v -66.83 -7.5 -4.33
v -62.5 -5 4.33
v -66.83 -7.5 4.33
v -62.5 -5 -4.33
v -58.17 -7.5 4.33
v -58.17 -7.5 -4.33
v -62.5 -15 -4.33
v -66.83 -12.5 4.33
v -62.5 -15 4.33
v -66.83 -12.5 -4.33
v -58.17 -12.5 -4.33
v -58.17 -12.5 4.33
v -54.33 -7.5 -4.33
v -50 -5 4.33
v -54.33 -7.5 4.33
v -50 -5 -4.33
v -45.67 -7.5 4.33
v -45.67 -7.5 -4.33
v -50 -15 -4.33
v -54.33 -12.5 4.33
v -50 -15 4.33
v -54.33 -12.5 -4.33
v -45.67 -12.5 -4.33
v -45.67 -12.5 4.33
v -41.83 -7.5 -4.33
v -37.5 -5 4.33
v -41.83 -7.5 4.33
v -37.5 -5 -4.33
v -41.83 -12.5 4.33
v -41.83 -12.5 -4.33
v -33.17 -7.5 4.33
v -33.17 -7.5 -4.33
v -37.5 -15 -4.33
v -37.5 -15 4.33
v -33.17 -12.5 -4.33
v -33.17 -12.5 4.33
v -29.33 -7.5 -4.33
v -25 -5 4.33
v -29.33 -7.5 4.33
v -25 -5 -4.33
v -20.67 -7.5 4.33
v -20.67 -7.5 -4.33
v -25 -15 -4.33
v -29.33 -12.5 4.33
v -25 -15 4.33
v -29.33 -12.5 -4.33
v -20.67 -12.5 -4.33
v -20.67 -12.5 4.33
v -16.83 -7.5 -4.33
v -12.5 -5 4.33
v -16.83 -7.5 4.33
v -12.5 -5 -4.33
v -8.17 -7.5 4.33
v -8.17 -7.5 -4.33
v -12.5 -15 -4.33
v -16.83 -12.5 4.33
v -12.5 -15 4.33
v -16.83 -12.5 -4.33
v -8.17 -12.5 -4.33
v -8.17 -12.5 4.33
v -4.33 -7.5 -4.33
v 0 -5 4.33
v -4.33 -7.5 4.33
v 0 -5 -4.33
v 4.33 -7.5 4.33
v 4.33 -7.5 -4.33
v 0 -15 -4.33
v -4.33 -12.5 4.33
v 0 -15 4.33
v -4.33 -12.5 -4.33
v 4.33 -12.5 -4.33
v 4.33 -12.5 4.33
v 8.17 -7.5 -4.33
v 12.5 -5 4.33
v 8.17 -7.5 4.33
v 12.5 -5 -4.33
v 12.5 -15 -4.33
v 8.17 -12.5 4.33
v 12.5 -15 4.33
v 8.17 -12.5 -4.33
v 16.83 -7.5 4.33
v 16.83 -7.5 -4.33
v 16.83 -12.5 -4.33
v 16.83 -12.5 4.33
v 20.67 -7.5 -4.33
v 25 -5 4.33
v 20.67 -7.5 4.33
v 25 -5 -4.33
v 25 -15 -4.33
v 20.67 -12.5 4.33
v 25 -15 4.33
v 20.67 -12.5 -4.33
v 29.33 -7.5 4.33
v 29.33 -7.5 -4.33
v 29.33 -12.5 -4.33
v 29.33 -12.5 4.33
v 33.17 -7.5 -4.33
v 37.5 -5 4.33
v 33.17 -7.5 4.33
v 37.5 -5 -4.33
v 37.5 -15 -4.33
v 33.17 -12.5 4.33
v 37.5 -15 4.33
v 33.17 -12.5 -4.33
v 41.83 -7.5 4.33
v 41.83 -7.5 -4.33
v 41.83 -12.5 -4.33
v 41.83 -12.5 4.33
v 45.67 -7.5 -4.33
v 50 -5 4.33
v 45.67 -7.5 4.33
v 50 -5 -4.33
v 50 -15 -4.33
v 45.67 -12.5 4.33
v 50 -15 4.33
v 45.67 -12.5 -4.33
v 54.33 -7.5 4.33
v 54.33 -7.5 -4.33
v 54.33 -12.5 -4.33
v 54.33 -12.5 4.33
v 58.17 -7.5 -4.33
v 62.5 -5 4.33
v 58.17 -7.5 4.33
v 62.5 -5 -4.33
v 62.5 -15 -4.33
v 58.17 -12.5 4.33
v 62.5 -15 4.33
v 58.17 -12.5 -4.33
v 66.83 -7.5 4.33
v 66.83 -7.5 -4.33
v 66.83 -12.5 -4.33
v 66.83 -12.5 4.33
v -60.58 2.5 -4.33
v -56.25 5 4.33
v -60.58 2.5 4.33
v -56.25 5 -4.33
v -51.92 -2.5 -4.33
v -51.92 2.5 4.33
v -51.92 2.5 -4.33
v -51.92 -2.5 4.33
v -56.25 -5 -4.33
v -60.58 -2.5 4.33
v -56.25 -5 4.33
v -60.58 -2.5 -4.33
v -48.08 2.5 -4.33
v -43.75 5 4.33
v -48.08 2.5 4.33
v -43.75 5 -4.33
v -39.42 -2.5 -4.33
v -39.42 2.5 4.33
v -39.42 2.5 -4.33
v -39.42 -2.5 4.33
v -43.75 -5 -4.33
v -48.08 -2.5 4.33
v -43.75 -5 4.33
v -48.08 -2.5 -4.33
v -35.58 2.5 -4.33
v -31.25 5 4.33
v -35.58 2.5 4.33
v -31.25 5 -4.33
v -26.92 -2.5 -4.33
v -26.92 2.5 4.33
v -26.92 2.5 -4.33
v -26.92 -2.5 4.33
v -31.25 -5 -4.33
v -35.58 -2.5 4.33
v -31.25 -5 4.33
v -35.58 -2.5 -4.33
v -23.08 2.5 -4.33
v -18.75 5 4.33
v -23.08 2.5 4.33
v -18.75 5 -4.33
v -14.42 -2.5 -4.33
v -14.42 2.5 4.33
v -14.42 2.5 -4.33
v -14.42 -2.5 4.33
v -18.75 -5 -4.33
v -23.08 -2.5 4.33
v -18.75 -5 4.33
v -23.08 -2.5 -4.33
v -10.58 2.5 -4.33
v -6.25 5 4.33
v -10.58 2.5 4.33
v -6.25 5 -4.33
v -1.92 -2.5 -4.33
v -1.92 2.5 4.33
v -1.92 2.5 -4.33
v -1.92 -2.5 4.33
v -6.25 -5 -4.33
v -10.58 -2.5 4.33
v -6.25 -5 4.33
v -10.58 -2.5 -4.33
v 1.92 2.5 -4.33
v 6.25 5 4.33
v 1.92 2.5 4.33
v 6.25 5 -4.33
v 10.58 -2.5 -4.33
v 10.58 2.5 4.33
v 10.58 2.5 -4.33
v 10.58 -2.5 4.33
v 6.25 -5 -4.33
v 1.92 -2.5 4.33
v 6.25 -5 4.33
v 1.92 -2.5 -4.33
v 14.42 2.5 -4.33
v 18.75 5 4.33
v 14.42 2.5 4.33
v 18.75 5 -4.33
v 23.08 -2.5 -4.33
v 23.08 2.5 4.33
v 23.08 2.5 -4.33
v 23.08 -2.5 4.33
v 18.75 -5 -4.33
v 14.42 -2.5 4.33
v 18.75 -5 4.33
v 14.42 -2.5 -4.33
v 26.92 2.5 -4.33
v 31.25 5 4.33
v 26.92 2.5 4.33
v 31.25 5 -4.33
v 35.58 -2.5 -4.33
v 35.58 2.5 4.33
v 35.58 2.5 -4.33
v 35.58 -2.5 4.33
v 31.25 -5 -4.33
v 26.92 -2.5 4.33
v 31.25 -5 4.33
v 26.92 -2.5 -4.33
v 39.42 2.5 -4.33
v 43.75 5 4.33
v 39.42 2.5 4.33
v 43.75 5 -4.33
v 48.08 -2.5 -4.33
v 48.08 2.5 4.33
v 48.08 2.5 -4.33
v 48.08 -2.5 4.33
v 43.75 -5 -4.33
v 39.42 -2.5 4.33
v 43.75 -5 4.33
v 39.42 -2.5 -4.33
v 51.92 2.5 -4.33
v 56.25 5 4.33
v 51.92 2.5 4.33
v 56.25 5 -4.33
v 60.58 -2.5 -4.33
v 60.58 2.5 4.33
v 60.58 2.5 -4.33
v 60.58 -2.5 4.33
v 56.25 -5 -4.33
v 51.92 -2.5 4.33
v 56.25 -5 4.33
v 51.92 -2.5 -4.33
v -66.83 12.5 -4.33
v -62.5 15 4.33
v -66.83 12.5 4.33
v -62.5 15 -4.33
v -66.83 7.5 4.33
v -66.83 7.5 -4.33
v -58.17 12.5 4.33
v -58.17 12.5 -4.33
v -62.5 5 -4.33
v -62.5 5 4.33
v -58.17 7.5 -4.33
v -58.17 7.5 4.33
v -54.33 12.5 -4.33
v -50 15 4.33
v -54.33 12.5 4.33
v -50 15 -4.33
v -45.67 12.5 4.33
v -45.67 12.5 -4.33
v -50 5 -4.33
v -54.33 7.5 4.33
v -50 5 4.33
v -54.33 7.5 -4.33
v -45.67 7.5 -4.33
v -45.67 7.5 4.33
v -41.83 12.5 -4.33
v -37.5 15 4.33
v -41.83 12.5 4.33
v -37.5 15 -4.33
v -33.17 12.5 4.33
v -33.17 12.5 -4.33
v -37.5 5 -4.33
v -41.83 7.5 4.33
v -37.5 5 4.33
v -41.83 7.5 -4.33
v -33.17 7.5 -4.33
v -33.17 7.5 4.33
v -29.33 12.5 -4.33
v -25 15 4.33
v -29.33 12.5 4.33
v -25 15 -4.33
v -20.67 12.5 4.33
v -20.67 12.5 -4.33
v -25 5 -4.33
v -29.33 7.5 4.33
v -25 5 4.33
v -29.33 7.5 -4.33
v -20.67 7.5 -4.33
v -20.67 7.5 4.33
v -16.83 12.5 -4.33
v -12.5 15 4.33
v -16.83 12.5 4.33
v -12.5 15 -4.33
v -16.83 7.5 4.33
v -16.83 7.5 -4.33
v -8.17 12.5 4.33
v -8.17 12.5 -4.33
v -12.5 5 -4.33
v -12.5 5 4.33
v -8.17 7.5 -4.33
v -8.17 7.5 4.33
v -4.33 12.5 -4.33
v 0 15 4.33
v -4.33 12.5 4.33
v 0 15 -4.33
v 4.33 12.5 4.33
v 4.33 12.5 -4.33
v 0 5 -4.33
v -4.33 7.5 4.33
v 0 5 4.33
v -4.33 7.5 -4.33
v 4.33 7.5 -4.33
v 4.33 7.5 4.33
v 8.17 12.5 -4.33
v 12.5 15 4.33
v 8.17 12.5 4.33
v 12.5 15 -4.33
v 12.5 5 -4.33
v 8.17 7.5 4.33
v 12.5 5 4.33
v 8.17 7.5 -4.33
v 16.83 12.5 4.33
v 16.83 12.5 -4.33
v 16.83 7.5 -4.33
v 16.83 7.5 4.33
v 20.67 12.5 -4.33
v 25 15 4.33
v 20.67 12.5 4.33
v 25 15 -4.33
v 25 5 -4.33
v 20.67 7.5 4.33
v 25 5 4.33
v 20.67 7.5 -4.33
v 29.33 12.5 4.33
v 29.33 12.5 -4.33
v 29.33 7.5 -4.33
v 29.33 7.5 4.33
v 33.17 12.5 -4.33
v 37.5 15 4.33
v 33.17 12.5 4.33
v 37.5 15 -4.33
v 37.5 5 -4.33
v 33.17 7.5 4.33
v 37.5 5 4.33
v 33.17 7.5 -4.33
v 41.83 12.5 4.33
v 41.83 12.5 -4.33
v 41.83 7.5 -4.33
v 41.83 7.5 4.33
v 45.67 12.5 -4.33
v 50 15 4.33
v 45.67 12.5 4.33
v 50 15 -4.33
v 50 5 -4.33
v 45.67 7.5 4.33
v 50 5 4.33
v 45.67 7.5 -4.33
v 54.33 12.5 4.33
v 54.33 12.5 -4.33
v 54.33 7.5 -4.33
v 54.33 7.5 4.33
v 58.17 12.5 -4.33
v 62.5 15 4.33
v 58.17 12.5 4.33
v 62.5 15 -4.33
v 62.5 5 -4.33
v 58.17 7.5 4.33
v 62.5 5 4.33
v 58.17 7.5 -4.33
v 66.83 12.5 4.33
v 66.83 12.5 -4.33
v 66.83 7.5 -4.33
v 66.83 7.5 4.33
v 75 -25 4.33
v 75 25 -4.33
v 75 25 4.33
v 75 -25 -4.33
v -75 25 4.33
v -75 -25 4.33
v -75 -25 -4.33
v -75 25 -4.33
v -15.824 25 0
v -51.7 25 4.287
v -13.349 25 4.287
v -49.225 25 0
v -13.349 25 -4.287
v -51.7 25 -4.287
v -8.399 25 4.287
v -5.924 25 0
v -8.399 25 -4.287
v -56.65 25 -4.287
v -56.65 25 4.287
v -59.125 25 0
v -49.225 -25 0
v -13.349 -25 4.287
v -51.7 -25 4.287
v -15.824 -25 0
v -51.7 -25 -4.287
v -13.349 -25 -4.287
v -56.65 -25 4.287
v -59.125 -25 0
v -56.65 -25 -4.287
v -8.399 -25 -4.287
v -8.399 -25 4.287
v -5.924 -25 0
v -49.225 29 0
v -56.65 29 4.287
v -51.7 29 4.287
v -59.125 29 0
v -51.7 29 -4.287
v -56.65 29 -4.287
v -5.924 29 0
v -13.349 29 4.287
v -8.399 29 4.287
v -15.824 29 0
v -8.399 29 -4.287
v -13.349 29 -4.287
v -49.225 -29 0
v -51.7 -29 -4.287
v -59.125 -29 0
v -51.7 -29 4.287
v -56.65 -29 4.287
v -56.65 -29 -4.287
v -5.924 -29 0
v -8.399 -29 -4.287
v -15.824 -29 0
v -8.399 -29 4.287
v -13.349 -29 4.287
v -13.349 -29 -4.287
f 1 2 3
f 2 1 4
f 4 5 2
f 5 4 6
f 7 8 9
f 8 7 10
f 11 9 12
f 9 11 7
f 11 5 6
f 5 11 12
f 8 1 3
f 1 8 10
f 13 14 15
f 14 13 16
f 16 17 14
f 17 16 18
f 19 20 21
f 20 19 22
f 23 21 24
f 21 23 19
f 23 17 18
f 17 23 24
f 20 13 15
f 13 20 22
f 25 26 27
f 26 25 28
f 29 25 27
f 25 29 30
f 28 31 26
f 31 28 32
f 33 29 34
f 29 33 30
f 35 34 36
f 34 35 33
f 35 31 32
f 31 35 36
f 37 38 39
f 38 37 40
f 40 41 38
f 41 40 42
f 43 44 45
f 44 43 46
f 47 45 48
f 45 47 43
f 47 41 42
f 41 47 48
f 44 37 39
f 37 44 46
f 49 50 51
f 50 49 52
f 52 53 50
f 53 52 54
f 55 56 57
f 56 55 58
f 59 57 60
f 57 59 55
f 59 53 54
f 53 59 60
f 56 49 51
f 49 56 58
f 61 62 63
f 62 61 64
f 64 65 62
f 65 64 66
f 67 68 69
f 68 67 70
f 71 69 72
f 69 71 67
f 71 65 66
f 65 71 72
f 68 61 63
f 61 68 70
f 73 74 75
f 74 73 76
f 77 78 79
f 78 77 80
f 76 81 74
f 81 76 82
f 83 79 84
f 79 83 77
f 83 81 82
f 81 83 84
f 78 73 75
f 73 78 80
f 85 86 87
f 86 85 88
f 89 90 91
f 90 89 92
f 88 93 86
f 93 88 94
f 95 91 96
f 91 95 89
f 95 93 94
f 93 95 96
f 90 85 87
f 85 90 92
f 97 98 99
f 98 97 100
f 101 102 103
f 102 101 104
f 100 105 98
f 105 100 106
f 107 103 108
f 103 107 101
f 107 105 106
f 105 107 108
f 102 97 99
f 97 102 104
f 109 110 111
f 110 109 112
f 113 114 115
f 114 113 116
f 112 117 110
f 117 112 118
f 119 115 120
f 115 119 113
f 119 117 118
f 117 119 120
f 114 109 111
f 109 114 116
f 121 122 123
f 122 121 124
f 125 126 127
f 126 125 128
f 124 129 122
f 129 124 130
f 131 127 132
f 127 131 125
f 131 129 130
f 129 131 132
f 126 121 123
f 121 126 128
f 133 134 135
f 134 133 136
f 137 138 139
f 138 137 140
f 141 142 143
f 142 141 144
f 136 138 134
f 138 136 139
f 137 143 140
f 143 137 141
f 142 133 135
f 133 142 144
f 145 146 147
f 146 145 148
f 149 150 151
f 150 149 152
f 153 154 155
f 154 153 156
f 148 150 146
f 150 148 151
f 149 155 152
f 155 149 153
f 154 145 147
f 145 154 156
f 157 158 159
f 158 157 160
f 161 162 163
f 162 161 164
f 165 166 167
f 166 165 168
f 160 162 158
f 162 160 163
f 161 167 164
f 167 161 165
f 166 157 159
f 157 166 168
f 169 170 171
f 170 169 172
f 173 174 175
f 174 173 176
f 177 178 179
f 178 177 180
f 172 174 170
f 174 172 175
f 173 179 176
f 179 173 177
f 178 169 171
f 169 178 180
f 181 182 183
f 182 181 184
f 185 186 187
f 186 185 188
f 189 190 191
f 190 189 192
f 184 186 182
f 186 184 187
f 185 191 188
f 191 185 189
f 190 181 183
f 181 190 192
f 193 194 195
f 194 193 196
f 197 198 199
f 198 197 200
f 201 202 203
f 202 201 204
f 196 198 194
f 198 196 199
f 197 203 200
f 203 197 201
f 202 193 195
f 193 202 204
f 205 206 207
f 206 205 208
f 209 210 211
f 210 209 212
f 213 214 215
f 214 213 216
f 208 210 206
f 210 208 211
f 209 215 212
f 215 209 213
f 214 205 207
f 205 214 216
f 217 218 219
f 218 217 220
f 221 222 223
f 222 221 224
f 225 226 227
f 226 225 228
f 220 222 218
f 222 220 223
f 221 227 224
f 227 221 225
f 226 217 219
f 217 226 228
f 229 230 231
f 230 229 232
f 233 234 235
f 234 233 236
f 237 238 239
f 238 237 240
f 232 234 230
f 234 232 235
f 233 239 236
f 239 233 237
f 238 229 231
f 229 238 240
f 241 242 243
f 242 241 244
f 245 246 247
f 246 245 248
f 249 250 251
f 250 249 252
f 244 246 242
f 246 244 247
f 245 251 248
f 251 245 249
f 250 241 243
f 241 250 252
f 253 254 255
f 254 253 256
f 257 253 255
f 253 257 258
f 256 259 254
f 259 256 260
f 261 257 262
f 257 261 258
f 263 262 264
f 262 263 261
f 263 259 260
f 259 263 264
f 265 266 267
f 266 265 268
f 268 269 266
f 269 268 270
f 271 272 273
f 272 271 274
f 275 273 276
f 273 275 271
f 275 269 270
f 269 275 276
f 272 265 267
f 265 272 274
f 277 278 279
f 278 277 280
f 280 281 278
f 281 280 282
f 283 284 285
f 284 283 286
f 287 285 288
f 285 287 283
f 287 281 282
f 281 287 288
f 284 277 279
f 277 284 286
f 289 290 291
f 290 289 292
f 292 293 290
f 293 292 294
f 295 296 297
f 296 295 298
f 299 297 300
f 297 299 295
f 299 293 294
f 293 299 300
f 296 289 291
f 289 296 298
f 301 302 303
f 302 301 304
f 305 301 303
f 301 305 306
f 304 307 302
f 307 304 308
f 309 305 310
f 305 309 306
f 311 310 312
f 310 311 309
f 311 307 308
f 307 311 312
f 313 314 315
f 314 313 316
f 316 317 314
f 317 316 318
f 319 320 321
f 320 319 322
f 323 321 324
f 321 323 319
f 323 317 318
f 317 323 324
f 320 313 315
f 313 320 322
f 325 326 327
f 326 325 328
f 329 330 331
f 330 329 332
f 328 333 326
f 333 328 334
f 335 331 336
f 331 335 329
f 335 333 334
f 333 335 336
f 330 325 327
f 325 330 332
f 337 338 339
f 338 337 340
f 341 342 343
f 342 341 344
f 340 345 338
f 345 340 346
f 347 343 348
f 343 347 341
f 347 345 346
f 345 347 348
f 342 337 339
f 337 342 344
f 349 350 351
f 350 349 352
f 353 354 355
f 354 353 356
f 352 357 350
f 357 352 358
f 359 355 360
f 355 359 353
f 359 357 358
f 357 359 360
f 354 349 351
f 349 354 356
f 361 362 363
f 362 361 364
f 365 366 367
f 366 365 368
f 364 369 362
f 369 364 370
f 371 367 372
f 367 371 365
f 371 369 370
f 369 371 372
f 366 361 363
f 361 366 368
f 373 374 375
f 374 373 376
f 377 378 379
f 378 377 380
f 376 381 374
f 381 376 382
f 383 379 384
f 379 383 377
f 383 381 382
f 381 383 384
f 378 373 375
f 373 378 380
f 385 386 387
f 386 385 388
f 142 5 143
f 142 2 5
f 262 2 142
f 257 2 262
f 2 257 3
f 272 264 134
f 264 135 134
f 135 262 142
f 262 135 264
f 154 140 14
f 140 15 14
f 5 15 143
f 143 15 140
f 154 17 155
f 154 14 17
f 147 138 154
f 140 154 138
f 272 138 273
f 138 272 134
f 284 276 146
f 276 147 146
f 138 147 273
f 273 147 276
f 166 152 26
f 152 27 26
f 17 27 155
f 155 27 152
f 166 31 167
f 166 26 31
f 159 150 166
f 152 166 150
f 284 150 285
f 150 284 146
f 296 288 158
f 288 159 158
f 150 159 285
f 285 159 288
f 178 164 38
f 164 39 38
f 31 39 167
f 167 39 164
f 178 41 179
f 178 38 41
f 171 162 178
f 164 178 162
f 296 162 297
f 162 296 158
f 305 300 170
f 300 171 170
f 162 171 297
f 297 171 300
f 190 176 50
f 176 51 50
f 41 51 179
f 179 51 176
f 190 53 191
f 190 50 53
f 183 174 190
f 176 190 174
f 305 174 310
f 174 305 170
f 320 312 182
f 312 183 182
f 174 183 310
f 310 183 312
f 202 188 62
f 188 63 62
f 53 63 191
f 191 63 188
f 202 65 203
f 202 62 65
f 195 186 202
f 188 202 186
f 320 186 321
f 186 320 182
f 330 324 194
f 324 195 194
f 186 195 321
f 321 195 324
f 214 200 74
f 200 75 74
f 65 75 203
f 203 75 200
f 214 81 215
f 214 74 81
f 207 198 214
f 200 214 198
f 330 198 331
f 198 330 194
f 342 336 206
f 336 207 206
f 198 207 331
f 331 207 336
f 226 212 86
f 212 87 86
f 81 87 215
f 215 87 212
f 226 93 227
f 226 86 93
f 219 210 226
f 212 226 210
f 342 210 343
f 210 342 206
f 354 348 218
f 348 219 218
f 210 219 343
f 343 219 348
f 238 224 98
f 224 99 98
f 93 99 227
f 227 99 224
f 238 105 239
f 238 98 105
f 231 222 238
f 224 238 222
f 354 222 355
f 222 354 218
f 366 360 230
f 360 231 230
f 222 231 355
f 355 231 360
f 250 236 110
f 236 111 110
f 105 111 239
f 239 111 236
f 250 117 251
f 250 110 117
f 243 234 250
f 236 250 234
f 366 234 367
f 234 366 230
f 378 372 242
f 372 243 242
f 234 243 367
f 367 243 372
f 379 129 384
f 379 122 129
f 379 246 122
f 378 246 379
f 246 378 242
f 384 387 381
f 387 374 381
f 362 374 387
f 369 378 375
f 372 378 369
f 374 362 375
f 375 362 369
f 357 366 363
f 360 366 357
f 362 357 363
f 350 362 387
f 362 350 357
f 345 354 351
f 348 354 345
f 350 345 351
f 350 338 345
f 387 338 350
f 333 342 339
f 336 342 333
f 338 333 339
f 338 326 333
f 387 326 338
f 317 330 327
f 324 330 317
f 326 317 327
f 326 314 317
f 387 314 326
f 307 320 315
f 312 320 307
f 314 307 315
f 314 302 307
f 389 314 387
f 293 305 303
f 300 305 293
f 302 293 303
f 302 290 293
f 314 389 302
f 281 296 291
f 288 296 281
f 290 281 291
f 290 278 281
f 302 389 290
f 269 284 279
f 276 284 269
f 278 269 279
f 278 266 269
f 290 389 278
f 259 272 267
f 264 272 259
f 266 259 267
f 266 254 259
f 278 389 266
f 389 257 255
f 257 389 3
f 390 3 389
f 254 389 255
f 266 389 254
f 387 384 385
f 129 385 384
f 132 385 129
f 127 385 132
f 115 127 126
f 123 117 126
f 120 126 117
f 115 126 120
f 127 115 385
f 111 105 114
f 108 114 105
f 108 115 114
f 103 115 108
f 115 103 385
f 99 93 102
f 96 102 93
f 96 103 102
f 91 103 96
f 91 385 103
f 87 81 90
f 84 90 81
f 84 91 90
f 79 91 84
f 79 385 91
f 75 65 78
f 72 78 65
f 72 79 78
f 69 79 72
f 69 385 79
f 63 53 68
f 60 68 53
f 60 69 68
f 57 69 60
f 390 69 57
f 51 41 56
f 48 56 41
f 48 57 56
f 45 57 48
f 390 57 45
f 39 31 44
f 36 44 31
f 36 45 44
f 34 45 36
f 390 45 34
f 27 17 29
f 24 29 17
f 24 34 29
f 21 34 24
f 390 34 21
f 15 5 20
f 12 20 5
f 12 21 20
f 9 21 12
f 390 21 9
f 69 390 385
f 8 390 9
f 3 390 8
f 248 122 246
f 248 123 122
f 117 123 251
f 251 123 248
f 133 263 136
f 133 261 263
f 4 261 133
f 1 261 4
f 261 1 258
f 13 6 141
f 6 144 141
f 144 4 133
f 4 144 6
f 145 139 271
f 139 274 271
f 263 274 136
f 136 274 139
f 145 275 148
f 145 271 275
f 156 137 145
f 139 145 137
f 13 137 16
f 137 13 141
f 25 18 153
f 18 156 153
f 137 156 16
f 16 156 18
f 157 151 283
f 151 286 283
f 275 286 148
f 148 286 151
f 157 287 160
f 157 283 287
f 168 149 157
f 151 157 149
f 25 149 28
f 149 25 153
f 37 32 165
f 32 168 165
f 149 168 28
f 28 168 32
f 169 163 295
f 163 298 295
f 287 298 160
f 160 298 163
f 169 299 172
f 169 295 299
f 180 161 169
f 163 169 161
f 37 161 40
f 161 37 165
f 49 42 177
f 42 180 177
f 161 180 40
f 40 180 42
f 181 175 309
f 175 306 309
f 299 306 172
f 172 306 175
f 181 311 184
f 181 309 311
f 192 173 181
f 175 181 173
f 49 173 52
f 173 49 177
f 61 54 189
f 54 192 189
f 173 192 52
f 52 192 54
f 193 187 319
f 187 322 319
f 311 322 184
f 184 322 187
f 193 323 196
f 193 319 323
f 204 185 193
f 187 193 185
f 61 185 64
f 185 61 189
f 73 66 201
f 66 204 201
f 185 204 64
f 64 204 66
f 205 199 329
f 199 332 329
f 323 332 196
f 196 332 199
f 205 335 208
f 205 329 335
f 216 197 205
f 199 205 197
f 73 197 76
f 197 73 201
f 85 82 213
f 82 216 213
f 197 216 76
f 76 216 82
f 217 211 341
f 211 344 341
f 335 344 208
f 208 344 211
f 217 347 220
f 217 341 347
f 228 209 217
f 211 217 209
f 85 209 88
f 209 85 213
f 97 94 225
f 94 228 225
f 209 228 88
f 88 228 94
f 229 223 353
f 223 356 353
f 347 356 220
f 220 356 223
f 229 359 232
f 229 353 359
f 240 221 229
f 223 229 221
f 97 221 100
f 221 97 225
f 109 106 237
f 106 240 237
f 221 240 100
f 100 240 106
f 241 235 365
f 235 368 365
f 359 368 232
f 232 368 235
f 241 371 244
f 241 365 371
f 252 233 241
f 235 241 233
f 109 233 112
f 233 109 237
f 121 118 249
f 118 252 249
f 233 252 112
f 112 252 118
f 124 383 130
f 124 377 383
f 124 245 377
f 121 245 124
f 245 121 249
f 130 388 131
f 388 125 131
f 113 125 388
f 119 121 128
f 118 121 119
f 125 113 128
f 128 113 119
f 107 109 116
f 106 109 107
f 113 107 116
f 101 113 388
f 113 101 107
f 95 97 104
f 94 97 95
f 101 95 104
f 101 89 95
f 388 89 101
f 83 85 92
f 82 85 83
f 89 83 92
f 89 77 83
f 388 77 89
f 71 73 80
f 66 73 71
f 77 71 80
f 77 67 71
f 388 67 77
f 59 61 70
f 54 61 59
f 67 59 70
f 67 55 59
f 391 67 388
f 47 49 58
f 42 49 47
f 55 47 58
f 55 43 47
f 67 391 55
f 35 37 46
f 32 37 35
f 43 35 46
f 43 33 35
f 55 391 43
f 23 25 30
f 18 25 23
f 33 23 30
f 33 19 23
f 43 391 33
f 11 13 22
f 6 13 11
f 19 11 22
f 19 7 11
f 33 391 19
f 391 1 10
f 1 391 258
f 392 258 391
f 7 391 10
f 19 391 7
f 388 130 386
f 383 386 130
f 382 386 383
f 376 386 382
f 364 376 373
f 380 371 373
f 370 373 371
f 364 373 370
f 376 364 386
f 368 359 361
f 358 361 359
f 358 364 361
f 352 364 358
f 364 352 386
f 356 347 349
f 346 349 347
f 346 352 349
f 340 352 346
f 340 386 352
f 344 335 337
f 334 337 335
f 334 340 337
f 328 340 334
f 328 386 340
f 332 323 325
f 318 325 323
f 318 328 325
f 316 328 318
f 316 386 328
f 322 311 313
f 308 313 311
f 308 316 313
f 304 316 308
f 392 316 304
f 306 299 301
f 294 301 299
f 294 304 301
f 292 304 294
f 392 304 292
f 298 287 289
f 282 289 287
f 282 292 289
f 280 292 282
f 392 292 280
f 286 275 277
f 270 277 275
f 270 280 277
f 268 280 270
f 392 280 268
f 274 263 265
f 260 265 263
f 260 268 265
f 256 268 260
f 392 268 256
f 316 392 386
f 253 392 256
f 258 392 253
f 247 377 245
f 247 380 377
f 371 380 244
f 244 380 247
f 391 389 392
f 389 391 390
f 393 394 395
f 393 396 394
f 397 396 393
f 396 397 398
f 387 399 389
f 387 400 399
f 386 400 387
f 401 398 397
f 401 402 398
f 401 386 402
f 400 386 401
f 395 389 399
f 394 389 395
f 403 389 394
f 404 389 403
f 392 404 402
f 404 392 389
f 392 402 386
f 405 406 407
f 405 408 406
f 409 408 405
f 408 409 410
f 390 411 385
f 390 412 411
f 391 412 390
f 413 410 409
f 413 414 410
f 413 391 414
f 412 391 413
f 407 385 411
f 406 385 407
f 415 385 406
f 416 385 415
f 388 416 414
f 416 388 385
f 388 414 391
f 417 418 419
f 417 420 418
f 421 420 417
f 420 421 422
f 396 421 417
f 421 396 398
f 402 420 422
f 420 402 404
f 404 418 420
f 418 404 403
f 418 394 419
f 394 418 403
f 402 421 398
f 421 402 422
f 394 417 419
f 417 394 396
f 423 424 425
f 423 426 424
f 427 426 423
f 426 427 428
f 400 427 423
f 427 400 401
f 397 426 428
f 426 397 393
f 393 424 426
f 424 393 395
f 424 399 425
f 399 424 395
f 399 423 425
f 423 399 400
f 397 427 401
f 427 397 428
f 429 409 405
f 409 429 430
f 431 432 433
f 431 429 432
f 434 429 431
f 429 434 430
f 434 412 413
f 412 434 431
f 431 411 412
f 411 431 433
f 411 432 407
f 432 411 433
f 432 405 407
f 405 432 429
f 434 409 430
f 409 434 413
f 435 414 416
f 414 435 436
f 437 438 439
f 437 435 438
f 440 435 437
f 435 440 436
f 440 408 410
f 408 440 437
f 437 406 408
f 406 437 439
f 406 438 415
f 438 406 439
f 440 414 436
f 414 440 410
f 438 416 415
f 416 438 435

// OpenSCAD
// file: hexagon.scad
module extruding_hexagon(height = 4, radius = 5, center = false) {
  linear_extrude(height = height, center=center) {
      rotate([0, 0, 30])
        circle(r=radius, $fn=6);
  }
}
// main file
use <hexagon.scad>

// Minimal angle for a fragment
$fa = 1;
// Minimal size for a fragment
$fs = 0.4;

wall_thickness = 5 * sqrt(3);
wall_height = 50;
wall_width = 150;

hexagon_x_distance = 12.5;
hexagon_y_distance = 10;
number_of_hexagons_in_x = floor(wall_width / hexagon_x_distance);
number_of_hexagons_in_y = floor(wall_height / hexagon_y_distance);

// Main wall
difference() {
  cube([wall_width, wall_height, wall_thickness], center=true);
  for (y = [-floor(number_of_hexagons_in_y/2)+1:floor(number_of_hexagons_in_y/2 - 1)]) {
    is_even = y % 2 == 0;
    hexagon_back_removal = is_even ? 1 : 0;
    x_offset = is_even ? hexagon_x_distance / 2 : 0;
    for (x = [-(number_of_hexagons_in_x / 2 - 1) :(number_of_hexagons_in_x / 2) - 1 - hexagon_back_removal]) {
      translate([x * hexagon_x_distance + x_offset, y * 10, 0])
        extruding_hexagon(height=wall_thickness+0.1, center=true);
    }
  }
}

module createConnector(){
        rotate([90, 30, 0])
        extruding_hexagon(height=connector_height, radius=connector_diameter/2, center=true);
}

// Connectors
connector_height = 8; // Only half of the height is visible
connector_diameter = 9.9;
translate([-wall_width/2, wall_height/2, 0]) {
  translate([20.825, 0, 0])
    createConnector();

  translate([64.126, 0, 0])
    createConnector();
}

translate([-wall_width/2, -wall_height/2, 0]) {
  translate([20.825, 0, 0])
    createConnector();

  translate([64.126, 0, 0])
    createConnector();
}
